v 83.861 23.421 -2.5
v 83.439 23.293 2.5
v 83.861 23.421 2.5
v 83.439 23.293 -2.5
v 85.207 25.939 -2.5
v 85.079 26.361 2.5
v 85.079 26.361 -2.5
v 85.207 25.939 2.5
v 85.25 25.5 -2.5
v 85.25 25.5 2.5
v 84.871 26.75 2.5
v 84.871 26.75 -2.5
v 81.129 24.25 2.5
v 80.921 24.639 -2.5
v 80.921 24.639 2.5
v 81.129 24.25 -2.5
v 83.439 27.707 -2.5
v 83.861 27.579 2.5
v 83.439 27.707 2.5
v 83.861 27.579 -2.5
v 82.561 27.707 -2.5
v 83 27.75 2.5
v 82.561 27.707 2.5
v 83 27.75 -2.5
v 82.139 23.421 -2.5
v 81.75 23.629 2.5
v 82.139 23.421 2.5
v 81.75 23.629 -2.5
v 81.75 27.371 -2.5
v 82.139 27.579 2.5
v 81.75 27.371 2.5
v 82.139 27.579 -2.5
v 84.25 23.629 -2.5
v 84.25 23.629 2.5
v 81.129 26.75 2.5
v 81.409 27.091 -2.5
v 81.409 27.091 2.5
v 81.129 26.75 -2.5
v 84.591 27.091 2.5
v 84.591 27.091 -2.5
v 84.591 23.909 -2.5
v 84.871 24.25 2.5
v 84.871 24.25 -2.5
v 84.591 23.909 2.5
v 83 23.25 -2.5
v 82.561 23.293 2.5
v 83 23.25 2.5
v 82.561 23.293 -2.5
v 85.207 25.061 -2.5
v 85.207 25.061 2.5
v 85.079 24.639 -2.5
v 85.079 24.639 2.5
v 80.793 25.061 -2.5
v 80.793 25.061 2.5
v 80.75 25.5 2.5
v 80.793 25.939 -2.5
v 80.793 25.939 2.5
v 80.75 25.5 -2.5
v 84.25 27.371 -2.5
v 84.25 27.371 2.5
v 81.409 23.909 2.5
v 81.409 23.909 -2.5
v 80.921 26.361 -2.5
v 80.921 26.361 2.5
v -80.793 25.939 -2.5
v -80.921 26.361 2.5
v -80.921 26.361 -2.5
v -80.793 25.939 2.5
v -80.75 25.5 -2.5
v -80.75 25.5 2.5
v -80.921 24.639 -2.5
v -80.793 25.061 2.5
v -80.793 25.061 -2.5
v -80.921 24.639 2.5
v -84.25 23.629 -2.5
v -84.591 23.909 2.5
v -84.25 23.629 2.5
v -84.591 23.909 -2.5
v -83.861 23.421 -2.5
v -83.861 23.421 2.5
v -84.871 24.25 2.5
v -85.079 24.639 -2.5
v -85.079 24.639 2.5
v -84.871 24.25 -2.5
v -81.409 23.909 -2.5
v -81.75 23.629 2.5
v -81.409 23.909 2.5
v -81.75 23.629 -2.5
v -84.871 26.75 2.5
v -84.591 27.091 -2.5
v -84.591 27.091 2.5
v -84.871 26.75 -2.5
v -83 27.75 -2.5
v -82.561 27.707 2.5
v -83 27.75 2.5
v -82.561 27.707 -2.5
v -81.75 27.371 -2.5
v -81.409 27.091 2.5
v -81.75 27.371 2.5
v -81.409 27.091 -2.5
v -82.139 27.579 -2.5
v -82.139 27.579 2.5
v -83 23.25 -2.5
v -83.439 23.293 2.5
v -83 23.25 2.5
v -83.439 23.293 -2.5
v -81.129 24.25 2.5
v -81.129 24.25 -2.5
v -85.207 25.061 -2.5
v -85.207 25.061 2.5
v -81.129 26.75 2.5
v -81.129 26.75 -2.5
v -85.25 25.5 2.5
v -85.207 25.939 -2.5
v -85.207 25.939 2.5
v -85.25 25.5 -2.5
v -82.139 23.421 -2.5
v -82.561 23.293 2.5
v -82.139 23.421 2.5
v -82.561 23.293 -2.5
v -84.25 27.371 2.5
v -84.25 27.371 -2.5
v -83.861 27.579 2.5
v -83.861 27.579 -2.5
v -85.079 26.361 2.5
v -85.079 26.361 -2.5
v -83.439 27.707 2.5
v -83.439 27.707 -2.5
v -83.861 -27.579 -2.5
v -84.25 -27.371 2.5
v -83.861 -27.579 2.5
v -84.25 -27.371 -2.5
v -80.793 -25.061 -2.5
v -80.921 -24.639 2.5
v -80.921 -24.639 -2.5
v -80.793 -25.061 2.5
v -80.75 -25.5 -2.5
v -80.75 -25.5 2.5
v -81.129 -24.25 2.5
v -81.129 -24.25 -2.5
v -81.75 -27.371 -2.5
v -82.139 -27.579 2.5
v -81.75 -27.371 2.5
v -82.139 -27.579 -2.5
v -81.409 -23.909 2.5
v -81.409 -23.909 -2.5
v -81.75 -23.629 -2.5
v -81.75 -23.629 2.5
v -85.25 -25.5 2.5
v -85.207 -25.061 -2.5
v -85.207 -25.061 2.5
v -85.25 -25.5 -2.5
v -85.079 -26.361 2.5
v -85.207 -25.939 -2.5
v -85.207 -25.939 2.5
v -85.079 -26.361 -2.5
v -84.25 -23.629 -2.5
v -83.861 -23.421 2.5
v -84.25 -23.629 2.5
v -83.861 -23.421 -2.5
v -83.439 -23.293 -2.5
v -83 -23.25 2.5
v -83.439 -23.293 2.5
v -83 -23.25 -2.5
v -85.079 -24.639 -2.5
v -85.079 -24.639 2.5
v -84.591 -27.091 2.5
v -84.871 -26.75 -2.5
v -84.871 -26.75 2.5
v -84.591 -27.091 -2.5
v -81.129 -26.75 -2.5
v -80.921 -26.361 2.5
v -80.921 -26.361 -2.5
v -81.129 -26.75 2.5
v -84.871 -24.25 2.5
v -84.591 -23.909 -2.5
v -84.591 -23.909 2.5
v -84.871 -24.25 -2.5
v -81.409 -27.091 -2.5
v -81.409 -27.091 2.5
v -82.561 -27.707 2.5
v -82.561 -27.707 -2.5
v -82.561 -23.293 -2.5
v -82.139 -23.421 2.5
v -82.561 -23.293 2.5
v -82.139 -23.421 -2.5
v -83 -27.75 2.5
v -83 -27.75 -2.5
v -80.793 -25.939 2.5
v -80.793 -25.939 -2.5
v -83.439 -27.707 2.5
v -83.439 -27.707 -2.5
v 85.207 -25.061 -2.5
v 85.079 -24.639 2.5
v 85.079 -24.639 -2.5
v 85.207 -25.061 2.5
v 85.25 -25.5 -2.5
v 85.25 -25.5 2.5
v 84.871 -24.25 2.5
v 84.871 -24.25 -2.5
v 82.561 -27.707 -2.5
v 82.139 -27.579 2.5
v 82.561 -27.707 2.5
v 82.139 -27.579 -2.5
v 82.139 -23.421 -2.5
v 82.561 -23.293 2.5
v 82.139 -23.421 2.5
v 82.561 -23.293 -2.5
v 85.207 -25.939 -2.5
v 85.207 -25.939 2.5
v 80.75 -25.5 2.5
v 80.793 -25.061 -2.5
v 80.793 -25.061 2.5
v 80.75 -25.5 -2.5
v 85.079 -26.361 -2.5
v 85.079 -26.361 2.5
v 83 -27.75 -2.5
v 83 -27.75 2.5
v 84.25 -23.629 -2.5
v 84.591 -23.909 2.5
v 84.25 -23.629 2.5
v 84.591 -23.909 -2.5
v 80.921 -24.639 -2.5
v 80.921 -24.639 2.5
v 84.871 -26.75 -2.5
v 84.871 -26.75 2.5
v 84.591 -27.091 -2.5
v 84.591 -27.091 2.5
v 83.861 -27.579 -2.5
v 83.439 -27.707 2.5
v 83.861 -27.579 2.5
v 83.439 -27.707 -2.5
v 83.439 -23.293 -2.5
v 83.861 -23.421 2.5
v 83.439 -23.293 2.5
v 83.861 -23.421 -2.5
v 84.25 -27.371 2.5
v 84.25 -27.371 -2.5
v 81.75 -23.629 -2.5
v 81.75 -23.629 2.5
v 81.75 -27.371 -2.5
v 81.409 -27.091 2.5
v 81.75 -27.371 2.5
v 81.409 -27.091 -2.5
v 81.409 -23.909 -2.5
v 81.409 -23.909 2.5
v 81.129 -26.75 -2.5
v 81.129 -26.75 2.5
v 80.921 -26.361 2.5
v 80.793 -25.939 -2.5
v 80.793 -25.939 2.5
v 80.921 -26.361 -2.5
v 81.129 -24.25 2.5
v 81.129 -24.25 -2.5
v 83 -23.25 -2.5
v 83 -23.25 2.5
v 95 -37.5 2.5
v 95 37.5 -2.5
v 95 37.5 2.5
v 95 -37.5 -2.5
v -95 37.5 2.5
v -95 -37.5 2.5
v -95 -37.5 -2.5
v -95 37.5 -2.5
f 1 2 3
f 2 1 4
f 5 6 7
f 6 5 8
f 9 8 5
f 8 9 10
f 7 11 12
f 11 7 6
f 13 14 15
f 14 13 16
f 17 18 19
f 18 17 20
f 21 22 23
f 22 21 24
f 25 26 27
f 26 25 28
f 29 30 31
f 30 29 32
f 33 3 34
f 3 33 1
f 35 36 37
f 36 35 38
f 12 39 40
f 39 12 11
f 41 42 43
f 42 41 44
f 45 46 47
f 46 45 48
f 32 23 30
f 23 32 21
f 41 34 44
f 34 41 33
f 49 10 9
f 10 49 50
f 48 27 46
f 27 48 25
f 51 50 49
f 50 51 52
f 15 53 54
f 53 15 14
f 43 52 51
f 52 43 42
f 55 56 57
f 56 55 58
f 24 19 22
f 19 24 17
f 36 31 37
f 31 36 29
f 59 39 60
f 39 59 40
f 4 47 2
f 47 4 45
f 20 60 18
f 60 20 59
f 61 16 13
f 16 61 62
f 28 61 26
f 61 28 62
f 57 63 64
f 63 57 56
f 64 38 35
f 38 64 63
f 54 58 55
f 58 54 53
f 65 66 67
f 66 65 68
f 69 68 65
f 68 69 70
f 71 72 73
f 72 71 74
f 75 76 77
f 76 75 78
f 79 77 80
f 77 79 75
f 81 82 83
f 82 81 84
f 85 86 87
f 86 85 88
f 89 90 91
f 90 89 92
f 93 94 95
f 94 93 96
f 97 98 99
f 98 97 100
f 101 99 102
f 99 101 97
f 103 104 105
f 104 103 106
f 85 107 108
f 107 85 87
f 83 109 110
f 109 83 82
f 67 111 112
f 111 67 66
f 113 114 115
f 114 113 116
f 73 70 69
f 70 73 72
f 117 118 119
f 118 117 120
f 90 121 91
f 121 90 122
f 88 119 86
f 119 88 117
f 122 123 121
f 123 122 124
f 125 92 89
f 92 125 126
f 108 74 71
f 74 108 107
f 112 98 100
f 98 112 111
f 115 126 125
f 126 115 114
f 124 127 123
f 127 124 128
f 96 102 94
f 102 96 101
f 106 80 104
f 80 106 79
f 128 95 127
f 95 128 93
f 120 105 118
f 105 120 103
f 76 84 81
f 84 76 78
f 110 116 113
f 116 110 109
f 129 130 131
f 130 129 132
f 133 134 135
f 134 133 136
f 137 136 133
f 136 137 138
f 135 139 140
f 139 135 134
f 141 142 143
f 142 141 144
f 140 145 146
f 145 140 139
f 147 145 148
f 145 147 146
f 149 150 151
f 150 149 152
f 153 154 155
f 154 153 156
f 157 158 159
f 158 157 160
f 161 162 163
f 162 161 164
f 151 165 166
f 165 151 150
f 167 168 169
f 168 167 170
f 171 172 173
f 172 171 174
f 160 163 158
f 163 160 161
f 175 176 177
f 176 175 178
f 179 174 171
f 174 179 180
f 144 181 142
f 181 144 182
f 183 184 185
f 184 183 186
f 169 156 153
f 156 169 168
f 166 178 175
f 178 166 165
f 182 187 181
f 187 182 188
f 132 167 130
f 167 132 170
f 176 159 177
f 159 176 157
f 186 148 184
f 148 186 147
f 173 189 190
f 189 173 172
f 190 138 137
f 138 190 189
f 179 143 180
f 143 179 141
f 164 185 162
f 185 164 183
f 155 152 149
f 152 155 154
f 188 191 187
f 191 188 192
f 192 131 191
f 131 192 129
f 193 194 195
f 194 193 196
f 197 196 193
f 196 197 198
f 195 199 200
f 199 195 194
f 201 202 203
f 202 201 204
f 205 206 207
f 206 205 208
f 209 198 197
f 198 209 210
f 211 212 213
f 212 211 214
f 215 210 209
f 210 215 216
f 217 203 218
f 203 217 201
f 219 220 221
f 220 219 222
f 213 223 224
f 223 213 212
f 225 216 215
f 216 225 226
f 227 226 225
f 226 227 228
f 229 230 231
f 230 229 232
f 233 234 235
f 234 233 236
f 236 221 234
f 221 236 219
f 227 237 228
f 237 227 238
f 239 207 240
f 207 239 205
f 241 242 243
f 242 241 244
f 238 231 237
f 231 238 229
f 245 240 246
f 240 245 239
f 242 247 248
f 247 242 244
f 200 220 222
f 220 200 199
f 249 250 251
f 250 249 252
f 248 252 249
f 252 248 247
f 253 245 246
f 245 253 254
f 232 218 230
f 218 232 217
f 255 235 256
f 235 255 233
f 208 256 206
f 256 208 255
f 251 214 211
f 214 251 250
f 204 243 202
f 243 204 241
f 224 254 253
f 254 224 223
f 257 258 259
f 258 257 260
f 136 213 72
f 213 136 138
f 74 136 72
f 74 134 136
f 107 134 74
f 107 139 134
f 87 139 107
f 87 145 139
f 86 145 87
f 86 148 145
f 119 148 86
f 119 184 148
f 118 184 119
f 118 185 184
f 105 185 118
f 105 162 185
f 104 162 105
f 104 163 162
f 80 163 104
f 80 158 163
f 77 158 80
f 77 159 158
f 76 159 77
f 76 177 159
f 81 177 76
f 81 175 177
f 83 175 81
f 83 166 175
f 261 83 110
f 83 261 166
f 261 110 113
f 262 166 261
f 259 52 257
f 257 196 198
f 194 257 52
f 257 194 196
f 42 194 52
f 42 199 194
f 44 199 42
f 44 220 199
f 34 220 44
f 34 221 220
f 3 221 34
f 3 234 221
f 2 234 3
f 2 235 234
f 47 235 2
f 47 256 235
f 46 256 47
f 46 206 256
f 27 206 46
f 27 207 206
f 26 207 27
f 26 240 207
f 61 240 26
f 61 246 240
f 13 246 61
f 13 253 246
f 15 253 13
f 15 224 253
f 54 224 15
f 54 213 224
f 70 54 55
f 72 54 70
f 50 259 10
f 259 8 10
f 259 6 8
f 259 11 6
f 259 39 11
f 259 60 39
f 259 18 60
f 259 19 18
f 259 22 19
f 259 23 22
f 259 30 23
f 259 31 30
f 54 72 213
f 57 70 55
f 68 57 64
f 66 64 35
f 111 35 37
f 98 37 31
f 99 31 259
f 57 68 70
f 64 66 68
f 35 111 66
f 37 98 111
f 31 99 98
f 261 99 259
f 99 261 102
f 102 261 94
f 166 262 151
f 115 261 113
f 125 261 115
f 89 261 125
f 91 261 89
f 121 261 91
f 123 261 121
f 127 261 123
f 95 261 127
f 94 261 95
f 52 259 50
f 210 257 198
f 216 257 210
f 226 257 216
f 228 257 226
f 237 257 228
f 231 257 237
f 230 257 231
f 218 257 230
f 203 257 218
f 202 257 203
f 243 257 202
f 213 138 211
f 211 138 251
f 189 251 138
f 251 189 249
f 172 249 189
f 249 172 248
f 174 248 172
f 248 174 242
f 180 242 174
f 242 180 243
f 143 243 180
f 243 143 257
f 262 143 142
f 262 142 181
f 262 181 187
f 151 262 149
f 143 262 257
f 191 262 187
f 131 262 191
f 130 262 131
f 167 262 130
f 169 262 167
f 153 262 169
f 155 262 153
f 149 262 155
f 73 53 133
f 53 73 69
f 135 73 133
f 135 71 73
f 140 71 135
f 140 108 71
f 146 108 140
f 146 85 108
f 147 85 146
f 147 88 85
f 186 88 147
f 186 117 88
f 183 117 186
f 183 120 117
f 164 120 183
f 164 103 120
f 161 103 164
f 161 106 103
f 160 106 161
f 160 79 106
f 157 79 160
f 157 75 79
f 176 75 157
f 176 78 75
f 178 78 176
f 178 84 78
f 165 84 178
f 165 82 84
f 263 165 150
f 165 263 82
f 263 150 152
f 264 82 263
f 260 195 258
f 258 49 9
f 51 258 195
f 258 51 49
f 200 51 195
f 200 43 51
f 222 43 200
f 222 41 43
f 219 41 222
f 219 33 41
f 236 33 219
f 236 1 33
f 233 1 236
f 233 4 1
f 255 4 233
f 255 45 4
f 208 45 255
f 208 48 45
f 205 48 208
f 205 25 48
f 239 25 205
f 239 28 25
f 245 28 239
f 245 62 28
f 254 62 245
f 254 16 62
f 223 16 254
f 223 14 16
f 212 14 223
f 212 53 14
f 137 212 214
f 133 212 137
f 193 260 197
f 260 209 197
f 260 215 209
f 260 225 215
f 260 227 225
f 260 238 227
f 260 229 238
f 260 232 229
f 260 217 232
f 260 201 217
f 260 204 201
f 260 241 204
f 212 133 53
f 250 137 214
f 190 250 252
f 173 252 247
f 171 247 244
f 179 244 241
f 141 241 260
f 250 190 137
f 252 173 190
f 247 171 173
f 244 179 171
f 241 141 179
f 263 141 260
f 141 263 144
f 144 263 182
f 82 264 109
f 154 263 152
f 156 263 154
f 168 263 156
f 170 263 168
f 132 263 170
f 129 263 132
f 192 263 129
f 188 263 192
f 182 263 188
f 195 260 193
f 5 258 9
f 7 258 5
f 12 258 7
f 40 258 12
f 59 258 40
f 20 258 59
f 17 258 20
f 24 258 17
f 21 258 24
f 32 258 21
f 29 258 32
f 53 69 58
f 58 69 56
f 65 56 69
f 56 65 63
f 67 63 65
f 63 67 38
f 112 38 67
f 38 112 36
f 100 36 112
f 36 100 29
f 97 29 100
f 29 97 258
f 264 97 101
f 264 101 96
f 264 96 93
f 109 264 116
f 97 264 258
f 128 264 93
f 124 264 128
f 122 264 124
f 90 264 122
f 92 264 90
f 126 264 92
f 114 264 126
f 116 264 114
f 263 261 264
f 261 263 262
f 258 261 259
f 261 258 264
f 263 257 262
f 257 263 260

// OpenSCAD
$fn = 32;

// ----------------------------------------------------------------------
// Corner plate 190 x 75 x 5
// 4 holes, centres taken from the edge offset
// ----------------------------------------------------------------------

// --- parameters (mm) ---
plate = [190, 75, 5];  // overall size (x, y, z)
holes = 4;             // number of holes the drawing asks for
hole_d = 4.5;          // hole diameter
edge = 12;             // hole centre offset from the plate edge

// --- derived feature positions (mm) ---
corner_x = plate[0] / 2 - edge;  // = 83   corner hole X
corner_y = plate[1] / 2 - edge;  // = 25.5   corner hole Y
feature_centers = [
  [corner_x, corner_y],
  [-corner_x, corner_y],
  [-corner_x, -corner_y],
  [corner_x, -corner_y]
];   // hole centres the loop below drills

// plate outline, every hole drilled through with the same cutters
difference() {
  cube(plate, center = true);
  for (centre = feature_centers)
    translate([centre[0], centre[1], 0])
      cylinder(d = hole_d, h = plate[2] + 2, center = true);
}
